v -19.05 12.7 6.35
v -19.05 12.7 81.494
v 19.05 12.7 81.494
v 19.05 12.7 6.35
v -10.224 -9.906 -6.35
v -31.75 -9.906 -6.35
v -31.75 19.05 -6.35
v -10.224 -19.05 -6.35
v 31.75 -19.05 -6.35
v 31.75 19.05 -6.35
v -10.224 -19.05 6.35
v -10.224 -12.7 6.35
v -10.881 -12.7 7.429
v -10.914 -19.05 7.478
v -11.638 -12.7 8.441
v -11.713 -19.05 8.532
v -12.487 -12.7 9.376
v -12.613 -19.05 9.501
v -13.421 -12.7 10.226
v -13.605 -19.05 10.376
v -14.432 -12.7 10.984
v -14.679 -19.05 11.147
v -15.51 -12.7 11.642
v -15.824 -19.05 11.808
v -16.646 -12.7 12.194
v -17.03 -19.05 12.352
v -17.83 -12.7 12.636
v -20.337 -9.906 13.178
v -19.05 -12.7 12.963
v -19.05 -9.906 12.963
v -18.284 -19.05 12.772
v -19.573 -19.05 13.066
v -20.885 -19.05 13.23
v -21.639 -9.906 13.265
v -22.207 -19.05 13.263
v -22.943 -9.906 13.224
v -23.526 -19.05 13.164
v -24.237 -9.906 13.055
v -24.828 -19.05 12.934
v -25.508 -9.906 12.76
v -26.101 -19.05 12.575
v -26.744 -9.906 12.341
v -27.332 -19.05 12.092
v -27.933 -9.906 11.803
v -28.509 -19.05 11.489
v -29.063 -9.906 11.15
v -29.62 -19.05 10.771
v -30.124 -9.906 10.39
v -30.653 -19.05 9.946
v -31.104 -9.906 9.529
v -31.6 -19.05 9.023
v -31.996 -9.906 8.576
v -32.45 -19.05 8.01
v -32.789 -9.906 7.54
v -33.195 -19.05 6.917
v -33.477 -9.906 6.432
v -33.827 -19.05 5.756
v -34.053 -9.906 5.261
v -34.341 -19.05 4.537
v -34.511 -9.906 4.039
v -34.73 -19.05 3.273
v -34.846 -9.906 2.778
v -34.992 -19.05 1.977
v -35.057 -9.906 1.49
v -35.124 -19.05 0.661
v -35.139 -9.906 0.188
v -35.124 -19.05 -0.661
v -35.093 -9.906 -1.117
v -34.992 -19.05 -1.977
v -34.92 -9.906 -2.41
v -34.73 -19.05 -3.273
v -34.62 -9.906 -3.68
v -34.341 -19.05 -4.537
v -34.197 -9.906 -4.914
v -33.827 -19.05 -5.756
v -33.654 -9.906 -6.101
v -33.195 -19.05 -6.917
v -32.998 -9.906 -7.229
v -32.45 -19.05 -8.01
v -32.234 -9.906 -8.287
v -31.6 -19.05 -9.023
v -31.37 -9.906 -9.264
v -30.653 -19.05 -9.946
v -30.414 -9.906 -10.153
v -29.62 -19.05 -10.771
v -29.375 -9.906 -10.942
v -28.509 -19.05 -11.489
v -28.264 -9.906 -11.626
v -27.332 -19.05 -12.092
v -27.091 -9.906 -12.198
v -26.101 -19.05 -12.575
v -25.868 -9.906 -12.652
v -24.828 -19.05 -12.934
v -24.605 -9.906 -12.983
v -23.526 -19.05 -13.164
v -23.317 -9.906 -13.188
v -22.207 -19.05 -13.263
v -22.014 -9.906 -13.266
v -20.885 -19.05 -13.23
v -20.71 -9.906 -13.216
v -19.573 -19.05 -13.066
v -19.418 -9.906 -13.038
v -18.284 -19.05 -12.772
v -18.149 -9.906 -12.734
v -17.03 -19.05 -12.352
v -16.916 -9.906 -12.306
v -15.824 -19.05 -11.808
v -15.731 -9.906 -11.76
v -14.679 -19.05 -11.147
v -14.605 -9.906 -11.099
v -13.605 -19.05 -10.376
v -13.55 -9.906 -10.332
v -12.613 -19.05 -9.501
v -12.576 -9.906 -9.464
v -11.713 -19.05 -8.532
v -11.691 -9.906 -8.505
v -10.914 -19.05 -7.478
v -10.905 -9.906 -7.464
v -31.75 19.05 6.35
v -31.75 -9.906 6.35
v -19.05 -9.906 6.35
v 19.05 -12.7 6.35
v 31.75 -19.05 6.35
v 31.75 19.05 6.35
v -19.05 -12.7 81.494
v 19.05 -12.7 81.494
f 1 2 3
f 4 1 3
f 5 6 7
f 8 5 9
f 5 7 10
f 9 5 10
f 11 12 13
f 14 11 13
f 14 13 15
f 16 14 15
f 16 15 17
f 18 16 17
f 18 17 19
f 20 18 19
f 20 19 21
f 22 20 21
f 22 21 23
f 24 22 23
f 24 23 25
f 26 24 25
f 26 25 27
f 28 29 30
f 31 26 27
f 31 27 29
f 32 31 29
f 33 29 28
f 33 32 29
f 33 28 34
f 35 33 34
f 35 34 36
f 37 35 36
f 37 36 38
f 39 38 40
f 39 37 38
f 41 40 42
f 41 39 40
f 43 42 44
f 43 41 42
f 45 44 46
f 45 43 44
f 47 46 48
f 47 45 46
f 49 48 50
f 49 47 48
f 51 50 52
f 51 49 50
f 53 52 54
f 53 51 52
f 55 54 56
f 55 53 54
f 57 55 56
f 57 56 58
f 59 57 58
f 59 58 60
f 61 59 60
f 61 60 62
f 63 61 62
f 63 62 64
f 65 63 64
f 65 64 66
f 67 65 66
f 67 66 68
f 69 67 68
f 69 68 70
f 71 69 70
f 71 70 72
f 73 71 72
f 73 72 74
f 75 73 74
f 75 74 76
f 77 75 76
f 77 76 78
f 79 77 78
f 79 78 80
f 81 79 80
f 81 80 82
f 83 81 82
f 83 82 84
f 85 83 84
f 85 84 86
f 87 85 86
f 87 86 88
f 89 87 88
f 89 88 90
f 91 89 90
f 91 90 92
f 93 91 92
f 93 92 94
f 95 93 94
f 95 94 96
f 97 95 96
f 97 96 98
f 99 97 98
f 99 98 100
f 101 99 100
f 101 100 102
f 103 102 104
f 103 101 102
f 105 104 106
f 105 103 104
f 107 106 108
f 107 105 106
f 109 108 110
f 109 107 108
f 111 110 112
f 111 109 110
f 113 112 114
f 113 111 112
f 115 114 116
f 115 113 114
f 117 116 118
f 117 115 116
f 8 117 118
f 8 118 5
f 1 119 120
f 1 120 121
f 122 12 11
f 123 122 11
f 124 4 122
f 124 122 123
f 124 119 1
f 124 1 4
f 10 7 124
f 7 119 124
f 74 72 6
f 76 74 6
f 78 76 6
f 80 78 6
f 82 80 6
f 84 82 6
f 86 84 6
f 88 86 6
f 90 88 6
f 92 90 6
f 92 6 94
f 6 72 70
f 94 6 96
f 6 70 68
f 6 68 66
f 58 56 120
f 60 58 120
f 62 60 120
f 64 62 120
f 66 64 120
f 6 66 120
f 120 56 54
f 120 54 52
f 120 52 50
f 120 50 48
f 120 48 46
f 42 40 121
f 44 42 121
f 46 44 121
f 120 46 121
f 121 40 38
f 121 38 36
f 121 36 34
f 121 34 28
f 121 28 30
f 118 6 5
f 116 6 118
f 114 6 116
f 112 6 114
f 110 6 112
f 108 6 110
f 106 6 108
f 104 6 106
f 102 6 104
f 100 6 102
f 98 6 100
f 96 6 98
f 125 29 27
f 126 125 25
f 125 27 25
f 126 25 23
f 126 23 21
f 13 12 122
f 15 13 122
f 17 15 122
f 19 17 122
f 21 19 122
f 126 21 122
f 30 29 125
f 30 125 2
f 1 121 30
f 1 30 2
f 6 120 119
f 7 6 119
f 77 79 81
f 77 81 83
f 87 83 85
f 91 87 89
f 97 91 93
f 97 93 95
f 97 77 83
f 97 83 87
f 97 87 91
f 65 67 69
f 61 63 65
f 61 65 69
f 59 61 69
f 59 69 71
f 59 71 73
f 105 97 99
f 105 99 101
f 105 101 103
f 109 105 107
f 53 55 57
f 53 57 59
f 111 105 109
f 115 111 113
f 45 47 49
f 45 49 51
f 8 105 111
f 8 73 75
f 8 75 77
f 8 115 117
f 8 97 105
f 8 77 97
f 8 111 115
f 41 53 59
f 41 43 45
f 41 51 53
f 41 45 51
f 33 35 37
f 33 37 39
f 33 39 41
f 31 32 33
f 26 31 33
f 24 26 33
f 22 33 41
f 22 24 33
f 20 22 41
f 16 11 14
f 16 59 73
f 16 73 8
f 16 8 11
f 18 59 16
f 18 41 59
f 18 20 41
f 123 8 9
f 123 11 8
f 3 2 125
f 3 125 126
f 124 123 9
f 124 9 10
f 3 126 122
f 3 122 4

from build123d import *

# Parameters (mm, degrees)
F0_W     = 63.5
F0_H     = 38.1
F1_DEPTH = 6.35
F2_W     = 38.1
F2_H     = 25.4
F3_DEPTH = 75.1442132
F5_DEPTH = 9.144


# Not quite as in the source:
# - an extrude ends at something that could not be found from the text; its depth is read off the source's solid


with BuildPart() as f1:
    # F0 (on Top) → F1 (new body, symmetric)
    with BuildSketch(Plane.XY):
        Rectangle(F0_W, F0_H)
    extrude(amount=F1_DEPTH, both=True)

    # F2 (on face) → F3 (join, through all)
    with BuildSketch(Plane.XY.offset(6.35)):
        Rectangle(F2_W, F2_H)
    extrude(amount=F3_DEPTH)

    # F4 (on face) → F5 (join)
    with BuildSketch(Plane.XZ.offset(19.05)):
        with BuildLine():
            Line((-31.75, 6.35), (-10.2243826786, 6.35))
            ThreePointArc((-10.2243826786, 6.35), (-35.1404271759, 0), (-10.2243826786, -6.35))
            Line((-10.2243826786, -6.35), (-31.75, -6.35))
            Line((-31.75, -6.35), (-31.75, 6.35))
        make_face()
    extrude(amount=-F5_DEPTH)


solid = f1.part
